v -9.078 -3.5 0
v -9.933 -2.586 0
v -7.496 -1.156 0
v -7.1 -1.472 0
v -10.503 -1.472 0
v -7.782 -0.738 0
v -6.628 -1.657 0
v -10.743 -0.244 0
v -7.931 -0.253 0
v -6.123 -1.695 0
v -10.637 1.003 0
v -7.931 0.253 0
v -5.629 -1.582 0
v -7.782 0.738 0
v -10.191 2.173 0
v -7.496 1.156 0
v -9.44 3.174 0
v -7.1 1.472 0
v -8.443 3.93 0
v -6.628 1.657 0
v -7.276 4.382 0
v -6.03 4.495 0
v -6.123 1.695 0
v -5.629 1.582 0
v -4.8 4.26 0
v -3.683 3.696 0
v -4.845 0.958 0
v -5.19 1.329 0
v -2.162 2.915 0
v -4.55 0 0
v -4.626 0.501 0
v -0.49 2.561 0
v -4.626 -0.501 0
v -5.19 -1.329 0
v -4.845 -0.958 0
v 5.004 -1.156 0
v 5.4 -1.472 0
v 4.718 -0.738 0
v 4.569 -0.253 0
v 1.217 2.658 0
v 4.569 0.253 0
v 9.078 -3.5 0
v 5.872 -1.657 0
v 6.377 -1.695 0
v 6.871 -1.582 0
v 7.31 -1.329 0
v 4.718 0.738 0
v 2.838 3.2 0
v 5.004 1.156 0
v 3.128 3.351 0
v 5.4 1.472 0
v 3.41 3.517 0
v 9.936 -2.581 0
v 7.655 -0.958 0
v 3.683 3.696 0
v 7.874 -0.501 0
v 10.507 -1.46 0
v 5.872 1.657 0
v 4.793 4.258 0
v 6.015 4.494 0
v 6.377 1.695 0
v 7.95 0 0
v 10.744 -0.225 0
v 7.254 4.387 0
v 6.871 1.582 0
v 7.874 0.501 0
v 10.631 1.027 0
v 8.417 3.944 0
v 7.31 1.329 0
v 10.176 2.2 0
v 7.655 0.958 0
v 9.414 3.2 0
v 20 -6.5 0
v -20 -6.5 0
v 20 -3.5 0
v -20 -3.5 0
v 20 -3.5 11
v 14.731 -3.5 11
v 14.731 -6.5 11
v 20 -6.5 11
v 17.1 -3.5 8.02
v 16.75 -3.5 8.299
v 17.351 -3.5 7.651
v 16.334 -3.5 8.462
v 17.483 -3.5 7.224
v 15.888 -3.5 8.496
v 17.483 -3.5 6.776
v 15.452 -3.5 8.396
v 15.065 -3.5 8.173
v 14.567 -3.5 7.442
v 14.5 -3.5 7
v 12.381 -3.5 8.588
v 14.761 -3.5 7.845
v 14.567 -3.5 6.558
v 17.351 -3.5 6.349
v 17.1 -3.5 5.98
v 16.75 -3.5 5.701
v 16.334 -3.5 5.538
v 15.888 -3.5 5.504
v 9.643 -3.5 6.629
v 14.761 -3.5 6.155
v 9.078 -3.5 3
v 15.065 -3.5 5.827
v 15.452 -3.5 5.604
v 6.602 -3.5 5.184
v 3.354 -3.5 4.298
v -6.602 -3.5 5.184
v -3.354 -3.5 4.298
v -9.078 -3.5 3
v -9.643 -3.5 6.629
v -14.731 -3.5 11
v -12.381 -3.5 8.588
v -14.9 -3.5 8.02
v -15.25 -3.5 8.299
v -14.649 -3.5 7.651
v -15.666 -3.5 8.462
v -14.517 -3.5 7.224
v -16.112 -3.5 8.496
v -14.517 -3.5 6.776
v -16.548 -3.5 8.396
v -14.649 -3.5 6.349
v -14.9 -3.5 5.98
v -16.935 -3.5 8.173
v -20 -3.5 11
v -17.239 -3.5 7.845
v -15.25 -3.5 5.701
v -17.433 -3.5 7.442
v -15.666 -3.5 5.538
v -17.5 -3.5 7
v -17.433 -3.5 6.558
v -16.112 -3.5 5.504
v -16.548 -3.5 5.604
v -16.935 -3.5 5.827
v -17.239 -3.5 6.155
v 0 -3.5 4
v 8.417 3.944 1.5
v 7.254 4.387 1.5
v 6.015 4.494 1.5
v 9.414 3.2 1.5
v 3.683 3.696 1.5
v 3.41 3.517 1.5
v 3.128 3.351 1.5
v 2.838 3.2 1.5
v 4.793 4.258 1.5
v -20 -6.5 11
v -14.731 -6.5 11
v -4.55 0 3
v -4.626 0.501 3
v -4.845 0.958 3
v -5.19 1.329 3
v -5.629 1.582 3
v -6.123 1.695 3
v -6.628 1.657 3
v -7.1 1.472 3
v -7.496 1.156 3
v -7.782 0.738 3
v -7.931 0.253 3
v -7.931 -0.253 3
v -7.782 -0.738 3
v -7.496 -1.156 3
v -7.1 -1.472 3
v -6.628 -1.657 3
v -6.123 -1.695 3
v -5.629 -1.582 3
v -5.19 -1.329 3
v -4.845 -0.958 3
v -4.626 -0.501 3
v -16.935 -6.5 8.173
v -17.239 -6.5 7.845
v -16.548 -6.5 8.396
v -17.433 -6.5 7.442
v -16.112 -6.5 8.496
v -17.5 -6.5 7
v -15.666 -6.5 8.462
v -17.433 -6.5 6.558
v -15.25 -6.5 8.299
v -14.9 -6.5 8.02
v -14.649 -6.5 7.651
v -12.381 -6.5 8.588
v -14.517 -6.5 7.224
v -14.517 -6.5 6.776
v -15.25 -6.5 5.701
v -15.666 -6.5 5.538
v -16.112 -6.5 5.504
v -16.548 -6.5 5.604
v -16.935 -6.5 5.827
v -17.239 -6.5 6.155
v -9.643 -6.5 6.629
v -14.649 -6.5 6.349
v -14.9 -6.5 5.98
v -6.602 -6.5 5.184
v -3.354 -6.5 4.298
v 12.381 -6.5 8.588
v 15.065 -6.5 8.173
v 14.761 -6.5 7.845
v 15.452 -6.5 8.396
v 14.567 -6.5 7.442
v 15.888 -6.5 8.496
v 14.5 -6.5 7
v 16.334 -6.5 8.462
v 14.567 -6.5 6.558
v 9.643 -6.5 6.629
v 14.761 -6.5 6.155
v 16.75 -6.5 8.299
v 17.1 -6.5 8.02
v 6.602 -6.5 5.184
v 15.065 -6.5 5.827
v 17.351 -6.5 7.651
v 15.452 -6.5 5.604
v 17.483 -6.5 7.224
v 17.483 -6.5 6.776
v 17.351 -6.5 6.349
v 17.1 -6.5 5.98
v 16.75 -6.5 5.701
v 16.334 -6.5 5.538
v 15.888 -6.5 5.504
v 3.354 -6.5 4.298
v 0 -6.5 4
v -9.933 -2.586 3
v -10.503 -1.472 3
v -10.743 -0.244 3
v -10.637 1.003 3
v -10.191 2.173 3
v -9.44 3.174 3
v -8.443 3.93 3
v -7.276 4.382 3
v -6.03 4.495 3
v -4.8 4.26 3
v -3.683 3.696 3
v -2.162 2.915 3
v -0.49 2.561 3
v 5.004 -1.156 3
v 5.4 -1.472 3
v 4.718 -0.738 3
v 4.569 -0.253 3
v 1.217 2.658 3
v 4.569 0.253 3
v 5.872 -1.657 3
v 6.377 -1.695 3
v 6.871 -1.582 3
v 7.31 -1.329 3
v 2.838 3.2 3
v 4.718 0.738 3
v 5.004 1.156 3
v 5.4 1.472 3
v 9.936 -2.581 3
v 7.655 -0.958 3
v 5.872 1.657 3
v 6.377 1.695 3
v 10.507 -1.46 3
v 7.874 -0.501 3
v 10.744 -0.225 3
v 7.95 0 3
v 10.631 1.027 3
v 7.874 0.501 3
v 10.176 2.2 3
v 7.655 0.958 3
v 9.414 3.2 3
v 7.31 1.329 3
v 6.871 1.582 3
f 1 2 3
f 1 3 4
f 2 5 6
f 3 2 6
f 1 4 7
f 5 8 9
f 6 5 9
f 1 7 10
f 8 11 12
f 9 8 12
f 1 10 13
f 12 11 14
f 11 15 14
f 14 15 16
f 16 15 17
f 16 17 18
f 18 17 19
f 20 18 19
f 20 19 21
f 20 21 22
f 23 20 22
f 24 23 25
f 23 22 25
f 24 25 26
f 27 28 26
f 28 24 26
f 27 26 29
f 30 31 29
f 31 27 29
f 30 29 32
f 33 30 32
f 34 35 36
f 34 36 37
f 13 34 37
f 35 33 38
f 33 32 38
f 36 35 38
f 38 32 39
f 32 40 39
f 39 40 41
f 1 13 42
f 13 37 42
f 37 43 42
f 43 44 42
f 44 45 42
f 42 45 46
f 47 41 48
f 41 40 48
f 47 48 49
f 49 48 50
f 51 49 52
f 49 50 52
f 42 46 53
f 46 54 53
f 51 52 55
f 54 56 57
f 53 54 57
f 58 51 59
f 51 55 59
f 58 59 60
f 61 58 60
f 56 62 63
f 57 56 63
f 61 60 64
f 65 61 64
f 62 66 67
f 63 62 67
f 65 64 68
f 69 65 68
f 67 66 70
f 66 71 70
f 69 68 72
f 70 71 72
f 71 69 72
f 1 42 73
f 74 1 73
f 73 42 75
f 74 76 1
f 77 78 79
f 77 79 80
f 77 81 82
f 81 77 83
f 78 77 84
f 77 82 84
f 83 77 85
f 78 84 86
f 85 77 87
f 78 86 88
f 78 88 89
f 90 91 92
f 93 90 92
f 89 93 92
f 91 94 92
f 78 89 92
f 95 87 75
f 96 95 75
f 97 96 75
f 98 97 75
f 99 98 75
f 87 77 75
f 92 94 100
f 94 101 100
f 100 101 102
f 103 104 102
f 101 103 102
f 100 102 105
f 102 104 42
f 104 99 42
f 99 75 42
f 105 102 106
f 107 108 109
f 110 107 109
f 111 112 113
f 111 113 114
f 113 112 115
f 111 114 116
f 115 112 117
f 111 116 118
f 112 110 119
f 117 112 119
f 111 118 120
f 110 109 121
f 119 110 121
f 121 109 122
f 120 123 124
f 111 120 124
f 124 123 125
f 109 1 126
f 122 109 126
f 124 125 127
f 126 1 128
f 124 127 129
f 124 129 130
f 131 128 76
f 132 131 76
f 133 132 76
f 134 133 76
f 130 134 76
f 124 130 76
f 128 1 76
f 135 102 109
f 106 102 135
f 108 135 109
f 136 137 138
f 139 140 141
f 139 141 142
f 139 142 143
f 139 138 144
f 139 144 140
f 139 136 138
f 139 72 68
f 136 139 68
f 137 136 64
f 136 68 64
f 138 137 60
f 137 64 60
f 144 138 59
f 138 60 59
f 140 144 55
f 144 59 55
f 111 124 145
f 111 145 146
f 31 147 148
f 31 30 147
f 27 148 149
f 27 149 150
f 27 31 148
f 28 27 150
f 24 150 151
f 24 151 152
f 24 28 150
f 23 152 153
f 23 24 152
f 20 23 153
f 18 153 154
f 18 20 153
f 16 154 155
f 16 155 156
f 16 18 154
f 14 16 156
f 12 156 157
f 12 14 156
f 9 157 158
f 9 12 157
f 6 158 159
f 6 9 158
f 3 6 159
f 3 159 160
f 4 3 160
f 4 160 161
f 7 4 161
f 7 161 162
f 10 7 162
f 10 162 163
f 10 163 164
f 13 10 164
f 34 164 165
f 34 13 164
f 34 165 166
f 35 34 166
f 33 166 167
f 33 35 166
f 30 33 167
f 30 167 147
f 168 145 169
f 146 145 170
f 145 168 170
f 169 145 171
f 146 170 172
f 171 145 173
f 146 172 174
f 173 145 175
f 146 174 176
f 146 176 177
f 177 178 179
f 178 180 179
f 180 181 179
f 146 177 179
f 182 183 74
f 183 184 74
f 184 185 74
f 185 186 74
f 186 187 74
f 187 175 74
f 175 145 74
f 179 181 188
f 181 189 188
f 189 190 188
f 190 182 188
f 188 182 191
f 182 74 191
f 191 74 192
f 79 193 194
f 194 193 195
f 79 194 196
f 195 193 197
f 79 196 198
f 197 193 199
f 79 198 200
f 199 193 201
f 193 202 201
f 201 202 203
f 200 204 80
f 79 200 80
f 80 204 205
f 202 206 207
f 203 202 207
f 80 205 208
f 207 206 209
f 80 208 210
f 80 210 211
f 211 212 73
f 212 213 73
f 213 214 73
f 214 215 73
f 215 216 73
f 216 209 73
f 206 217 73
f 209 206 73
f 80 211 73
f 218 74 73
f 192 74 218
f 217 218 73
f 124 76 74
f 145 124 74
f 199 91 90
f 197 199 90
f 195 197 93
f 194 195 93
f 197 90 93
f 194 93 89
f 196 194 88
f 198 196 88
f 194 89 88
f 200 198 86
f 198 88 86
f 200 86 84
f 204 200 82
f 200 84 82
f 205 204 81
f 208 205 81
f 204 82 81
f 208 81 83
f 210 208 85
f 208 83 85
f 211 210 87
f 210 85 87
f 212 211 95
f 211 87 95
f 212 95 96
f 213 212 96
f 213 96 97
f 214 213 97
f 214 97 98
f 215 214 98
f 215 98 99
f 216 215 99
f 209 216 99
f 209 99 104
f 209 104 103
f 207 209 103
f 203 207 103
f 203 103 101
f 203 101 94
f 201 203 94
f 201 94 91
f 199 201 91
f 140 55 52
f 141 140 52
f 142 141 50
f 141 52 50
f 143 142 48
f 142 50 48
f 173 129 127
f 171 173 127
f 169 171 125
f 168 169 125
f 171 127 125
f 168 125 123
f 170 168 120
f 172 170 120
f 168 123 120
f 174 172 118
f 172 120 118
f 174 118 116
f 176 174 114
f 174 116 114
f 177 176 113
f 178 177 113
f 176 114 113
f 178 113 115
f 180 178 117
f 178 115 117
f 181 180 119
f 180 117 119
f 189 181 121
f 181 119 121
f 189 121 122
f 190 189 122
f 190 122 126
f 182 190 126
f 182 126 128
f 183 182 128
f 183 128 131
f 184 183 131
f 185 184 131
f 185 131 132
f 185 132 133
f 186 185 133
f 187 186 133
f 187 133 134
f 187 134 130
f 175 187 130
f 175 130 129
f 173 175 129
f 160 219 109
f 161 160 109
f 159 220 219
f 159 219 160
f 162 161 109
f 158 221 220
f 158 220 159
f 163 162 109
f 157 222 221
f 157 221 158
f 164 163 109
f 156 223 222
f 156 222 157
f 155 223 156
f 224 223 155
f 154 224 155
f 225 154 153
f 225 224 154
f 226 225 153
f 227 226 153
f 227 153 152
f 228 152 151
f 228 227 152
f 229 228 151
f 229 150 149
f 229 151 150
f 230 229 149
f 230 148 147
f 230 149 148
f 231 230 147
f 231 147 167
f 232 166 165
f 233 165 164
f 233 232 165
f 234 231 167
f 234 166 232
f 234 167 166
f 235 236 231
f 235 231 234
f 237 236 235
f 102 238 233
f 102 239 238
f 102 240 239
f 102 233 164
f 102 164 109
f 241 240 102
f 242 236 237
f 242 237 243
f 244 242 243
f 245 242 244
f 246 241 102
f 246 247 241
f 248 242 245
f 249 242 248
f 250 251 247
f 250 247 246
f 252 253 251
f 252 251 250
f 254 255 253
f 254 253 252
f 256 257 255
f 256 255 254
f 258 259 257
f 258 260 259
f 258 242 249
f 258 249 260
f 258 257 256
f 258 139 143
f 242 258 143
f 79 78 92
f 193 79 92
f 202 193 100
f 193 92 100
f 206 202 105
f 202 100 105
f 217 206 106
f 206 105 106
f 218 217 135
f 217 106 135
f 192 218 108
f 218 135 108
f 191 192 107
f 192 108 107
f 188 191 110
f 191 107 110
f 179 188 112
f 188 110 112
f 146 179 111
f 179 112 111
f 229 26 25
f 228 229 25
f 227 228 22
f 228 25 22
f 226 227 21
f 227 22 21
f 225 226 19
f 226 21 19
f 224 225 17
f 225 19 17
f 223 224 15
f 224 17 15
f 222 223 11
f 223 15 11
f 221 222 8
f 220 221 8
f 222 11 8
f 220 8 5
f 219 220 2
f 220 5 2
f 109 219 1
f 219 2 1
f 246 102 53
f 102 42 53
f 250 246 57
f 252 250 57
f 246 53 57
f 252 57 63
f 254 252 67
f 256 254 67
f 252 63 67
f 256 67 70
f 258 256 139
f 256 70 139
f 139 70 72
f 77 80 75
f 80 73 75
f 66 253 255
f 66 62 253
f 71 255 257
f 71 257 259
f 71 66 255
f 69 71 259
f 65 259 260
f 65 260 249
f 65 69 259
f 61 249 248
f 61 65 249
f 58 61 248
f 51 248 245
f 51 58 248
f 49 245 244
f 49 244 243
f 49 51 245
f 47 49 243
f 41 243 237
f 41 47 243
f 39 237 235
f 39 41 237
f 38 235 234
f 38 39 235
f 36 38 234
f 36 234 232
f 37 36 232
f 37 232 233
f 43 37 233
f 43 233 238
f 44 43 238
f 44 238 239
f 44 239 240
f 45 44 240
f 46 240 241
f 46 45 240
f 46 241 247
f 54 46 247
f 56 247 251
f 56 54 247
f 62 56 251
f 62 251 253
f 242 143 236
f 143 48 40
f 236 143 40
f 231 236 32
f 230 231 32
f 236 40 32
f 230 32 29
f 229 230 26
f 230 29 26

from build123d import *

# Parameters (mm, degrees)
F0_R     = 1.7
F1_DEPTH = 1.5
F2_R     = 1.7
F3_DEPTH = 1.5
F5_DEPTH = 8
F6_R     = 19
F6_R_2   = 1.5
F7_DEPTH = 3.001


with BuildPart() as f1:
    # F0 (on Top) → F1 (new body)
    with BuildSketch(Plane.XY):
        Polygon((3.421573, -3.5), (-3.421573, -3.5), (-9.078427, -3.5), (-20, -3.5), (-20, -6.5), (20, -6.5), (20, -3.5), (9.078427, -3.5), align=None)
        with BuildLine():
            Line((-9.078427, -3.5), (-3.421573, -3.5))
            ThreePointArc((-3.421573, -3.5), (-1.752972, 0.163508), (-3.683219, 3.696165))
            ThreePointArc((-3.683219, 3.696165), (-9.85046, 2.699387), (-9.078427, -3.5))
        make_face()
        with Locations((-6.25, 0)):
            Circle(F0_R, mode=Mode.SUBTRACT)
        with BuildLine():
            ThreePointArc((-3.683219, 3.696165), (-1.752972, 0.163508), (-3.421573, -3.5))
            Line((-3.421573, -3.5), (3.421573, -3.5))
            ThreePointArc((3.421573, -3.5), (1.755629, -0.225008), (3.086142, 3.2))
            Line((3.086142, 3.2), (2.838445, 3.2))
            ThreePointArc((2.838445, 3.2), (-0.489853, 2.561303), (-3.683219, 3.696165))
        make_face()
        with BuildLine():
            ThreePointArc((3.086142, 3.2), (1.755629, -0.225008), (3.421573, -3.5))
            Line((3.421573, -3.5), (9.078427, -3.5))
            ThreePointArc((9.078427, -3.5), (10.744371, -0.225008), (9.413858, 3.2))
            Line((9.413858, 3.2), (3.086142, 3.2))
        make_face()
        with Locations((6.25, 0)):
            Circle(F0_R, mode=Mode.SUBTRACT)
        with BuildLine():
            ThreePointArc((3.683219, 3.696165), (3.270255, 3.432038), (2.838445, 3.2))
            Line((2.838445, 3.2), (3.086142, 3.2))
            Line((3.086142, 3.2), (9.413858, 3.2))
            ThreePointArc((9.413858, 3.2), (6.638163, 4.483228), (3.683219, 3.696165))
        make_face()
    extrude(amount=F1_DEPTH)

    # F2 (on face) → F3 (join)
    with BuildSketch(Plane.XY.offset(1.5)):
        with BuildLine():
            Line((-9.078427, -3.5), (-3.421573, -3.5))
            ThreePointArc((-3.421573, -3.5), (-1.752972, 0.163508), (-3.683219, 3.696165))
            ThreePointArc((-3.683219, 3.696165), (-9.85046, 2.699387), (-9.078427, -3.5))
        make_face()
        with Locations((-6.25, 0)):
            Circle(F2_R, mode=Mode.SUBTRACT)
        with BuildLine():
            ThreePointArc((-3.683219, 3.696165), (-1.752972, 0.163508), (-3.421573, -3.5))
            Line((-3.421573, -3.5), (3.421573, -3.5))
            ThreePointArc((3.421573, -3.5), (1.755629, -0.225008), (3.086142, 3.2))
            Line((3.086142, 3.2), (2.838445, 3.2))
            ThreePointArc((2.838445, 3.2), (-0.489853, 2.561303), (-3.683219, 3.696165))
        make_face()
        with BuildLine():
            ThreePointArc((3.086142, 3.2), (1.755629, -0.225008), (3.421573, -3.5))
            Line((3.421573, -3.5), (9.078427, -3.5))
            ThreePointArc((9.078427, -3.5), (10.744371, -0.225008), (9.413858, 3.2))
            Line((9.413858, 3.2), (3.086142, 3.2))
        make_face()
        with Locations((6.25, 0)):
            Circle(F2_R, mode=Mode.SUBTRACT)
        Polygon((3.421573, -3.5), (-3.421573, -3.5), (-9.078427, -3.5), (-20, -3.5), (-20, -6.5), (20, -6.5), (20, -3.5), (9.078427, -3.5), align=None)
    extrude(amount=F3_DEPTH)

    # F4 (on face) → F5 (join)
    with BuildSketch(Plane.XY.offset(3)):
        Polygon((3.421573, -3.5), (-3.421573, -3.5), (-9.078427, -3.5), (-20, -3.5), (-20, -6.5), (20, -6.5), (20, -3.5), (9.078427, -3.5), align=None)
    extrude(amount=F5_DEPTH)

    # F6 (on face) → F7 (cut, through all)
    with BuildSketch(Plane(origin=(0, -3.5, 0), x_dir=(-1, 0, 0), z_dir=(0, 1, 0))):
        with Locations((0, 23)):
            Circle(F6_R)
        with Locations((-16, 7)):
            Circle(F6_R_2)
        with Locations((16, 7)):
            Circle(F6_R_2)
    extrude(amount=-F7_DEPTH, mode=Mode.SUBTRACT)


solid = f1.part
